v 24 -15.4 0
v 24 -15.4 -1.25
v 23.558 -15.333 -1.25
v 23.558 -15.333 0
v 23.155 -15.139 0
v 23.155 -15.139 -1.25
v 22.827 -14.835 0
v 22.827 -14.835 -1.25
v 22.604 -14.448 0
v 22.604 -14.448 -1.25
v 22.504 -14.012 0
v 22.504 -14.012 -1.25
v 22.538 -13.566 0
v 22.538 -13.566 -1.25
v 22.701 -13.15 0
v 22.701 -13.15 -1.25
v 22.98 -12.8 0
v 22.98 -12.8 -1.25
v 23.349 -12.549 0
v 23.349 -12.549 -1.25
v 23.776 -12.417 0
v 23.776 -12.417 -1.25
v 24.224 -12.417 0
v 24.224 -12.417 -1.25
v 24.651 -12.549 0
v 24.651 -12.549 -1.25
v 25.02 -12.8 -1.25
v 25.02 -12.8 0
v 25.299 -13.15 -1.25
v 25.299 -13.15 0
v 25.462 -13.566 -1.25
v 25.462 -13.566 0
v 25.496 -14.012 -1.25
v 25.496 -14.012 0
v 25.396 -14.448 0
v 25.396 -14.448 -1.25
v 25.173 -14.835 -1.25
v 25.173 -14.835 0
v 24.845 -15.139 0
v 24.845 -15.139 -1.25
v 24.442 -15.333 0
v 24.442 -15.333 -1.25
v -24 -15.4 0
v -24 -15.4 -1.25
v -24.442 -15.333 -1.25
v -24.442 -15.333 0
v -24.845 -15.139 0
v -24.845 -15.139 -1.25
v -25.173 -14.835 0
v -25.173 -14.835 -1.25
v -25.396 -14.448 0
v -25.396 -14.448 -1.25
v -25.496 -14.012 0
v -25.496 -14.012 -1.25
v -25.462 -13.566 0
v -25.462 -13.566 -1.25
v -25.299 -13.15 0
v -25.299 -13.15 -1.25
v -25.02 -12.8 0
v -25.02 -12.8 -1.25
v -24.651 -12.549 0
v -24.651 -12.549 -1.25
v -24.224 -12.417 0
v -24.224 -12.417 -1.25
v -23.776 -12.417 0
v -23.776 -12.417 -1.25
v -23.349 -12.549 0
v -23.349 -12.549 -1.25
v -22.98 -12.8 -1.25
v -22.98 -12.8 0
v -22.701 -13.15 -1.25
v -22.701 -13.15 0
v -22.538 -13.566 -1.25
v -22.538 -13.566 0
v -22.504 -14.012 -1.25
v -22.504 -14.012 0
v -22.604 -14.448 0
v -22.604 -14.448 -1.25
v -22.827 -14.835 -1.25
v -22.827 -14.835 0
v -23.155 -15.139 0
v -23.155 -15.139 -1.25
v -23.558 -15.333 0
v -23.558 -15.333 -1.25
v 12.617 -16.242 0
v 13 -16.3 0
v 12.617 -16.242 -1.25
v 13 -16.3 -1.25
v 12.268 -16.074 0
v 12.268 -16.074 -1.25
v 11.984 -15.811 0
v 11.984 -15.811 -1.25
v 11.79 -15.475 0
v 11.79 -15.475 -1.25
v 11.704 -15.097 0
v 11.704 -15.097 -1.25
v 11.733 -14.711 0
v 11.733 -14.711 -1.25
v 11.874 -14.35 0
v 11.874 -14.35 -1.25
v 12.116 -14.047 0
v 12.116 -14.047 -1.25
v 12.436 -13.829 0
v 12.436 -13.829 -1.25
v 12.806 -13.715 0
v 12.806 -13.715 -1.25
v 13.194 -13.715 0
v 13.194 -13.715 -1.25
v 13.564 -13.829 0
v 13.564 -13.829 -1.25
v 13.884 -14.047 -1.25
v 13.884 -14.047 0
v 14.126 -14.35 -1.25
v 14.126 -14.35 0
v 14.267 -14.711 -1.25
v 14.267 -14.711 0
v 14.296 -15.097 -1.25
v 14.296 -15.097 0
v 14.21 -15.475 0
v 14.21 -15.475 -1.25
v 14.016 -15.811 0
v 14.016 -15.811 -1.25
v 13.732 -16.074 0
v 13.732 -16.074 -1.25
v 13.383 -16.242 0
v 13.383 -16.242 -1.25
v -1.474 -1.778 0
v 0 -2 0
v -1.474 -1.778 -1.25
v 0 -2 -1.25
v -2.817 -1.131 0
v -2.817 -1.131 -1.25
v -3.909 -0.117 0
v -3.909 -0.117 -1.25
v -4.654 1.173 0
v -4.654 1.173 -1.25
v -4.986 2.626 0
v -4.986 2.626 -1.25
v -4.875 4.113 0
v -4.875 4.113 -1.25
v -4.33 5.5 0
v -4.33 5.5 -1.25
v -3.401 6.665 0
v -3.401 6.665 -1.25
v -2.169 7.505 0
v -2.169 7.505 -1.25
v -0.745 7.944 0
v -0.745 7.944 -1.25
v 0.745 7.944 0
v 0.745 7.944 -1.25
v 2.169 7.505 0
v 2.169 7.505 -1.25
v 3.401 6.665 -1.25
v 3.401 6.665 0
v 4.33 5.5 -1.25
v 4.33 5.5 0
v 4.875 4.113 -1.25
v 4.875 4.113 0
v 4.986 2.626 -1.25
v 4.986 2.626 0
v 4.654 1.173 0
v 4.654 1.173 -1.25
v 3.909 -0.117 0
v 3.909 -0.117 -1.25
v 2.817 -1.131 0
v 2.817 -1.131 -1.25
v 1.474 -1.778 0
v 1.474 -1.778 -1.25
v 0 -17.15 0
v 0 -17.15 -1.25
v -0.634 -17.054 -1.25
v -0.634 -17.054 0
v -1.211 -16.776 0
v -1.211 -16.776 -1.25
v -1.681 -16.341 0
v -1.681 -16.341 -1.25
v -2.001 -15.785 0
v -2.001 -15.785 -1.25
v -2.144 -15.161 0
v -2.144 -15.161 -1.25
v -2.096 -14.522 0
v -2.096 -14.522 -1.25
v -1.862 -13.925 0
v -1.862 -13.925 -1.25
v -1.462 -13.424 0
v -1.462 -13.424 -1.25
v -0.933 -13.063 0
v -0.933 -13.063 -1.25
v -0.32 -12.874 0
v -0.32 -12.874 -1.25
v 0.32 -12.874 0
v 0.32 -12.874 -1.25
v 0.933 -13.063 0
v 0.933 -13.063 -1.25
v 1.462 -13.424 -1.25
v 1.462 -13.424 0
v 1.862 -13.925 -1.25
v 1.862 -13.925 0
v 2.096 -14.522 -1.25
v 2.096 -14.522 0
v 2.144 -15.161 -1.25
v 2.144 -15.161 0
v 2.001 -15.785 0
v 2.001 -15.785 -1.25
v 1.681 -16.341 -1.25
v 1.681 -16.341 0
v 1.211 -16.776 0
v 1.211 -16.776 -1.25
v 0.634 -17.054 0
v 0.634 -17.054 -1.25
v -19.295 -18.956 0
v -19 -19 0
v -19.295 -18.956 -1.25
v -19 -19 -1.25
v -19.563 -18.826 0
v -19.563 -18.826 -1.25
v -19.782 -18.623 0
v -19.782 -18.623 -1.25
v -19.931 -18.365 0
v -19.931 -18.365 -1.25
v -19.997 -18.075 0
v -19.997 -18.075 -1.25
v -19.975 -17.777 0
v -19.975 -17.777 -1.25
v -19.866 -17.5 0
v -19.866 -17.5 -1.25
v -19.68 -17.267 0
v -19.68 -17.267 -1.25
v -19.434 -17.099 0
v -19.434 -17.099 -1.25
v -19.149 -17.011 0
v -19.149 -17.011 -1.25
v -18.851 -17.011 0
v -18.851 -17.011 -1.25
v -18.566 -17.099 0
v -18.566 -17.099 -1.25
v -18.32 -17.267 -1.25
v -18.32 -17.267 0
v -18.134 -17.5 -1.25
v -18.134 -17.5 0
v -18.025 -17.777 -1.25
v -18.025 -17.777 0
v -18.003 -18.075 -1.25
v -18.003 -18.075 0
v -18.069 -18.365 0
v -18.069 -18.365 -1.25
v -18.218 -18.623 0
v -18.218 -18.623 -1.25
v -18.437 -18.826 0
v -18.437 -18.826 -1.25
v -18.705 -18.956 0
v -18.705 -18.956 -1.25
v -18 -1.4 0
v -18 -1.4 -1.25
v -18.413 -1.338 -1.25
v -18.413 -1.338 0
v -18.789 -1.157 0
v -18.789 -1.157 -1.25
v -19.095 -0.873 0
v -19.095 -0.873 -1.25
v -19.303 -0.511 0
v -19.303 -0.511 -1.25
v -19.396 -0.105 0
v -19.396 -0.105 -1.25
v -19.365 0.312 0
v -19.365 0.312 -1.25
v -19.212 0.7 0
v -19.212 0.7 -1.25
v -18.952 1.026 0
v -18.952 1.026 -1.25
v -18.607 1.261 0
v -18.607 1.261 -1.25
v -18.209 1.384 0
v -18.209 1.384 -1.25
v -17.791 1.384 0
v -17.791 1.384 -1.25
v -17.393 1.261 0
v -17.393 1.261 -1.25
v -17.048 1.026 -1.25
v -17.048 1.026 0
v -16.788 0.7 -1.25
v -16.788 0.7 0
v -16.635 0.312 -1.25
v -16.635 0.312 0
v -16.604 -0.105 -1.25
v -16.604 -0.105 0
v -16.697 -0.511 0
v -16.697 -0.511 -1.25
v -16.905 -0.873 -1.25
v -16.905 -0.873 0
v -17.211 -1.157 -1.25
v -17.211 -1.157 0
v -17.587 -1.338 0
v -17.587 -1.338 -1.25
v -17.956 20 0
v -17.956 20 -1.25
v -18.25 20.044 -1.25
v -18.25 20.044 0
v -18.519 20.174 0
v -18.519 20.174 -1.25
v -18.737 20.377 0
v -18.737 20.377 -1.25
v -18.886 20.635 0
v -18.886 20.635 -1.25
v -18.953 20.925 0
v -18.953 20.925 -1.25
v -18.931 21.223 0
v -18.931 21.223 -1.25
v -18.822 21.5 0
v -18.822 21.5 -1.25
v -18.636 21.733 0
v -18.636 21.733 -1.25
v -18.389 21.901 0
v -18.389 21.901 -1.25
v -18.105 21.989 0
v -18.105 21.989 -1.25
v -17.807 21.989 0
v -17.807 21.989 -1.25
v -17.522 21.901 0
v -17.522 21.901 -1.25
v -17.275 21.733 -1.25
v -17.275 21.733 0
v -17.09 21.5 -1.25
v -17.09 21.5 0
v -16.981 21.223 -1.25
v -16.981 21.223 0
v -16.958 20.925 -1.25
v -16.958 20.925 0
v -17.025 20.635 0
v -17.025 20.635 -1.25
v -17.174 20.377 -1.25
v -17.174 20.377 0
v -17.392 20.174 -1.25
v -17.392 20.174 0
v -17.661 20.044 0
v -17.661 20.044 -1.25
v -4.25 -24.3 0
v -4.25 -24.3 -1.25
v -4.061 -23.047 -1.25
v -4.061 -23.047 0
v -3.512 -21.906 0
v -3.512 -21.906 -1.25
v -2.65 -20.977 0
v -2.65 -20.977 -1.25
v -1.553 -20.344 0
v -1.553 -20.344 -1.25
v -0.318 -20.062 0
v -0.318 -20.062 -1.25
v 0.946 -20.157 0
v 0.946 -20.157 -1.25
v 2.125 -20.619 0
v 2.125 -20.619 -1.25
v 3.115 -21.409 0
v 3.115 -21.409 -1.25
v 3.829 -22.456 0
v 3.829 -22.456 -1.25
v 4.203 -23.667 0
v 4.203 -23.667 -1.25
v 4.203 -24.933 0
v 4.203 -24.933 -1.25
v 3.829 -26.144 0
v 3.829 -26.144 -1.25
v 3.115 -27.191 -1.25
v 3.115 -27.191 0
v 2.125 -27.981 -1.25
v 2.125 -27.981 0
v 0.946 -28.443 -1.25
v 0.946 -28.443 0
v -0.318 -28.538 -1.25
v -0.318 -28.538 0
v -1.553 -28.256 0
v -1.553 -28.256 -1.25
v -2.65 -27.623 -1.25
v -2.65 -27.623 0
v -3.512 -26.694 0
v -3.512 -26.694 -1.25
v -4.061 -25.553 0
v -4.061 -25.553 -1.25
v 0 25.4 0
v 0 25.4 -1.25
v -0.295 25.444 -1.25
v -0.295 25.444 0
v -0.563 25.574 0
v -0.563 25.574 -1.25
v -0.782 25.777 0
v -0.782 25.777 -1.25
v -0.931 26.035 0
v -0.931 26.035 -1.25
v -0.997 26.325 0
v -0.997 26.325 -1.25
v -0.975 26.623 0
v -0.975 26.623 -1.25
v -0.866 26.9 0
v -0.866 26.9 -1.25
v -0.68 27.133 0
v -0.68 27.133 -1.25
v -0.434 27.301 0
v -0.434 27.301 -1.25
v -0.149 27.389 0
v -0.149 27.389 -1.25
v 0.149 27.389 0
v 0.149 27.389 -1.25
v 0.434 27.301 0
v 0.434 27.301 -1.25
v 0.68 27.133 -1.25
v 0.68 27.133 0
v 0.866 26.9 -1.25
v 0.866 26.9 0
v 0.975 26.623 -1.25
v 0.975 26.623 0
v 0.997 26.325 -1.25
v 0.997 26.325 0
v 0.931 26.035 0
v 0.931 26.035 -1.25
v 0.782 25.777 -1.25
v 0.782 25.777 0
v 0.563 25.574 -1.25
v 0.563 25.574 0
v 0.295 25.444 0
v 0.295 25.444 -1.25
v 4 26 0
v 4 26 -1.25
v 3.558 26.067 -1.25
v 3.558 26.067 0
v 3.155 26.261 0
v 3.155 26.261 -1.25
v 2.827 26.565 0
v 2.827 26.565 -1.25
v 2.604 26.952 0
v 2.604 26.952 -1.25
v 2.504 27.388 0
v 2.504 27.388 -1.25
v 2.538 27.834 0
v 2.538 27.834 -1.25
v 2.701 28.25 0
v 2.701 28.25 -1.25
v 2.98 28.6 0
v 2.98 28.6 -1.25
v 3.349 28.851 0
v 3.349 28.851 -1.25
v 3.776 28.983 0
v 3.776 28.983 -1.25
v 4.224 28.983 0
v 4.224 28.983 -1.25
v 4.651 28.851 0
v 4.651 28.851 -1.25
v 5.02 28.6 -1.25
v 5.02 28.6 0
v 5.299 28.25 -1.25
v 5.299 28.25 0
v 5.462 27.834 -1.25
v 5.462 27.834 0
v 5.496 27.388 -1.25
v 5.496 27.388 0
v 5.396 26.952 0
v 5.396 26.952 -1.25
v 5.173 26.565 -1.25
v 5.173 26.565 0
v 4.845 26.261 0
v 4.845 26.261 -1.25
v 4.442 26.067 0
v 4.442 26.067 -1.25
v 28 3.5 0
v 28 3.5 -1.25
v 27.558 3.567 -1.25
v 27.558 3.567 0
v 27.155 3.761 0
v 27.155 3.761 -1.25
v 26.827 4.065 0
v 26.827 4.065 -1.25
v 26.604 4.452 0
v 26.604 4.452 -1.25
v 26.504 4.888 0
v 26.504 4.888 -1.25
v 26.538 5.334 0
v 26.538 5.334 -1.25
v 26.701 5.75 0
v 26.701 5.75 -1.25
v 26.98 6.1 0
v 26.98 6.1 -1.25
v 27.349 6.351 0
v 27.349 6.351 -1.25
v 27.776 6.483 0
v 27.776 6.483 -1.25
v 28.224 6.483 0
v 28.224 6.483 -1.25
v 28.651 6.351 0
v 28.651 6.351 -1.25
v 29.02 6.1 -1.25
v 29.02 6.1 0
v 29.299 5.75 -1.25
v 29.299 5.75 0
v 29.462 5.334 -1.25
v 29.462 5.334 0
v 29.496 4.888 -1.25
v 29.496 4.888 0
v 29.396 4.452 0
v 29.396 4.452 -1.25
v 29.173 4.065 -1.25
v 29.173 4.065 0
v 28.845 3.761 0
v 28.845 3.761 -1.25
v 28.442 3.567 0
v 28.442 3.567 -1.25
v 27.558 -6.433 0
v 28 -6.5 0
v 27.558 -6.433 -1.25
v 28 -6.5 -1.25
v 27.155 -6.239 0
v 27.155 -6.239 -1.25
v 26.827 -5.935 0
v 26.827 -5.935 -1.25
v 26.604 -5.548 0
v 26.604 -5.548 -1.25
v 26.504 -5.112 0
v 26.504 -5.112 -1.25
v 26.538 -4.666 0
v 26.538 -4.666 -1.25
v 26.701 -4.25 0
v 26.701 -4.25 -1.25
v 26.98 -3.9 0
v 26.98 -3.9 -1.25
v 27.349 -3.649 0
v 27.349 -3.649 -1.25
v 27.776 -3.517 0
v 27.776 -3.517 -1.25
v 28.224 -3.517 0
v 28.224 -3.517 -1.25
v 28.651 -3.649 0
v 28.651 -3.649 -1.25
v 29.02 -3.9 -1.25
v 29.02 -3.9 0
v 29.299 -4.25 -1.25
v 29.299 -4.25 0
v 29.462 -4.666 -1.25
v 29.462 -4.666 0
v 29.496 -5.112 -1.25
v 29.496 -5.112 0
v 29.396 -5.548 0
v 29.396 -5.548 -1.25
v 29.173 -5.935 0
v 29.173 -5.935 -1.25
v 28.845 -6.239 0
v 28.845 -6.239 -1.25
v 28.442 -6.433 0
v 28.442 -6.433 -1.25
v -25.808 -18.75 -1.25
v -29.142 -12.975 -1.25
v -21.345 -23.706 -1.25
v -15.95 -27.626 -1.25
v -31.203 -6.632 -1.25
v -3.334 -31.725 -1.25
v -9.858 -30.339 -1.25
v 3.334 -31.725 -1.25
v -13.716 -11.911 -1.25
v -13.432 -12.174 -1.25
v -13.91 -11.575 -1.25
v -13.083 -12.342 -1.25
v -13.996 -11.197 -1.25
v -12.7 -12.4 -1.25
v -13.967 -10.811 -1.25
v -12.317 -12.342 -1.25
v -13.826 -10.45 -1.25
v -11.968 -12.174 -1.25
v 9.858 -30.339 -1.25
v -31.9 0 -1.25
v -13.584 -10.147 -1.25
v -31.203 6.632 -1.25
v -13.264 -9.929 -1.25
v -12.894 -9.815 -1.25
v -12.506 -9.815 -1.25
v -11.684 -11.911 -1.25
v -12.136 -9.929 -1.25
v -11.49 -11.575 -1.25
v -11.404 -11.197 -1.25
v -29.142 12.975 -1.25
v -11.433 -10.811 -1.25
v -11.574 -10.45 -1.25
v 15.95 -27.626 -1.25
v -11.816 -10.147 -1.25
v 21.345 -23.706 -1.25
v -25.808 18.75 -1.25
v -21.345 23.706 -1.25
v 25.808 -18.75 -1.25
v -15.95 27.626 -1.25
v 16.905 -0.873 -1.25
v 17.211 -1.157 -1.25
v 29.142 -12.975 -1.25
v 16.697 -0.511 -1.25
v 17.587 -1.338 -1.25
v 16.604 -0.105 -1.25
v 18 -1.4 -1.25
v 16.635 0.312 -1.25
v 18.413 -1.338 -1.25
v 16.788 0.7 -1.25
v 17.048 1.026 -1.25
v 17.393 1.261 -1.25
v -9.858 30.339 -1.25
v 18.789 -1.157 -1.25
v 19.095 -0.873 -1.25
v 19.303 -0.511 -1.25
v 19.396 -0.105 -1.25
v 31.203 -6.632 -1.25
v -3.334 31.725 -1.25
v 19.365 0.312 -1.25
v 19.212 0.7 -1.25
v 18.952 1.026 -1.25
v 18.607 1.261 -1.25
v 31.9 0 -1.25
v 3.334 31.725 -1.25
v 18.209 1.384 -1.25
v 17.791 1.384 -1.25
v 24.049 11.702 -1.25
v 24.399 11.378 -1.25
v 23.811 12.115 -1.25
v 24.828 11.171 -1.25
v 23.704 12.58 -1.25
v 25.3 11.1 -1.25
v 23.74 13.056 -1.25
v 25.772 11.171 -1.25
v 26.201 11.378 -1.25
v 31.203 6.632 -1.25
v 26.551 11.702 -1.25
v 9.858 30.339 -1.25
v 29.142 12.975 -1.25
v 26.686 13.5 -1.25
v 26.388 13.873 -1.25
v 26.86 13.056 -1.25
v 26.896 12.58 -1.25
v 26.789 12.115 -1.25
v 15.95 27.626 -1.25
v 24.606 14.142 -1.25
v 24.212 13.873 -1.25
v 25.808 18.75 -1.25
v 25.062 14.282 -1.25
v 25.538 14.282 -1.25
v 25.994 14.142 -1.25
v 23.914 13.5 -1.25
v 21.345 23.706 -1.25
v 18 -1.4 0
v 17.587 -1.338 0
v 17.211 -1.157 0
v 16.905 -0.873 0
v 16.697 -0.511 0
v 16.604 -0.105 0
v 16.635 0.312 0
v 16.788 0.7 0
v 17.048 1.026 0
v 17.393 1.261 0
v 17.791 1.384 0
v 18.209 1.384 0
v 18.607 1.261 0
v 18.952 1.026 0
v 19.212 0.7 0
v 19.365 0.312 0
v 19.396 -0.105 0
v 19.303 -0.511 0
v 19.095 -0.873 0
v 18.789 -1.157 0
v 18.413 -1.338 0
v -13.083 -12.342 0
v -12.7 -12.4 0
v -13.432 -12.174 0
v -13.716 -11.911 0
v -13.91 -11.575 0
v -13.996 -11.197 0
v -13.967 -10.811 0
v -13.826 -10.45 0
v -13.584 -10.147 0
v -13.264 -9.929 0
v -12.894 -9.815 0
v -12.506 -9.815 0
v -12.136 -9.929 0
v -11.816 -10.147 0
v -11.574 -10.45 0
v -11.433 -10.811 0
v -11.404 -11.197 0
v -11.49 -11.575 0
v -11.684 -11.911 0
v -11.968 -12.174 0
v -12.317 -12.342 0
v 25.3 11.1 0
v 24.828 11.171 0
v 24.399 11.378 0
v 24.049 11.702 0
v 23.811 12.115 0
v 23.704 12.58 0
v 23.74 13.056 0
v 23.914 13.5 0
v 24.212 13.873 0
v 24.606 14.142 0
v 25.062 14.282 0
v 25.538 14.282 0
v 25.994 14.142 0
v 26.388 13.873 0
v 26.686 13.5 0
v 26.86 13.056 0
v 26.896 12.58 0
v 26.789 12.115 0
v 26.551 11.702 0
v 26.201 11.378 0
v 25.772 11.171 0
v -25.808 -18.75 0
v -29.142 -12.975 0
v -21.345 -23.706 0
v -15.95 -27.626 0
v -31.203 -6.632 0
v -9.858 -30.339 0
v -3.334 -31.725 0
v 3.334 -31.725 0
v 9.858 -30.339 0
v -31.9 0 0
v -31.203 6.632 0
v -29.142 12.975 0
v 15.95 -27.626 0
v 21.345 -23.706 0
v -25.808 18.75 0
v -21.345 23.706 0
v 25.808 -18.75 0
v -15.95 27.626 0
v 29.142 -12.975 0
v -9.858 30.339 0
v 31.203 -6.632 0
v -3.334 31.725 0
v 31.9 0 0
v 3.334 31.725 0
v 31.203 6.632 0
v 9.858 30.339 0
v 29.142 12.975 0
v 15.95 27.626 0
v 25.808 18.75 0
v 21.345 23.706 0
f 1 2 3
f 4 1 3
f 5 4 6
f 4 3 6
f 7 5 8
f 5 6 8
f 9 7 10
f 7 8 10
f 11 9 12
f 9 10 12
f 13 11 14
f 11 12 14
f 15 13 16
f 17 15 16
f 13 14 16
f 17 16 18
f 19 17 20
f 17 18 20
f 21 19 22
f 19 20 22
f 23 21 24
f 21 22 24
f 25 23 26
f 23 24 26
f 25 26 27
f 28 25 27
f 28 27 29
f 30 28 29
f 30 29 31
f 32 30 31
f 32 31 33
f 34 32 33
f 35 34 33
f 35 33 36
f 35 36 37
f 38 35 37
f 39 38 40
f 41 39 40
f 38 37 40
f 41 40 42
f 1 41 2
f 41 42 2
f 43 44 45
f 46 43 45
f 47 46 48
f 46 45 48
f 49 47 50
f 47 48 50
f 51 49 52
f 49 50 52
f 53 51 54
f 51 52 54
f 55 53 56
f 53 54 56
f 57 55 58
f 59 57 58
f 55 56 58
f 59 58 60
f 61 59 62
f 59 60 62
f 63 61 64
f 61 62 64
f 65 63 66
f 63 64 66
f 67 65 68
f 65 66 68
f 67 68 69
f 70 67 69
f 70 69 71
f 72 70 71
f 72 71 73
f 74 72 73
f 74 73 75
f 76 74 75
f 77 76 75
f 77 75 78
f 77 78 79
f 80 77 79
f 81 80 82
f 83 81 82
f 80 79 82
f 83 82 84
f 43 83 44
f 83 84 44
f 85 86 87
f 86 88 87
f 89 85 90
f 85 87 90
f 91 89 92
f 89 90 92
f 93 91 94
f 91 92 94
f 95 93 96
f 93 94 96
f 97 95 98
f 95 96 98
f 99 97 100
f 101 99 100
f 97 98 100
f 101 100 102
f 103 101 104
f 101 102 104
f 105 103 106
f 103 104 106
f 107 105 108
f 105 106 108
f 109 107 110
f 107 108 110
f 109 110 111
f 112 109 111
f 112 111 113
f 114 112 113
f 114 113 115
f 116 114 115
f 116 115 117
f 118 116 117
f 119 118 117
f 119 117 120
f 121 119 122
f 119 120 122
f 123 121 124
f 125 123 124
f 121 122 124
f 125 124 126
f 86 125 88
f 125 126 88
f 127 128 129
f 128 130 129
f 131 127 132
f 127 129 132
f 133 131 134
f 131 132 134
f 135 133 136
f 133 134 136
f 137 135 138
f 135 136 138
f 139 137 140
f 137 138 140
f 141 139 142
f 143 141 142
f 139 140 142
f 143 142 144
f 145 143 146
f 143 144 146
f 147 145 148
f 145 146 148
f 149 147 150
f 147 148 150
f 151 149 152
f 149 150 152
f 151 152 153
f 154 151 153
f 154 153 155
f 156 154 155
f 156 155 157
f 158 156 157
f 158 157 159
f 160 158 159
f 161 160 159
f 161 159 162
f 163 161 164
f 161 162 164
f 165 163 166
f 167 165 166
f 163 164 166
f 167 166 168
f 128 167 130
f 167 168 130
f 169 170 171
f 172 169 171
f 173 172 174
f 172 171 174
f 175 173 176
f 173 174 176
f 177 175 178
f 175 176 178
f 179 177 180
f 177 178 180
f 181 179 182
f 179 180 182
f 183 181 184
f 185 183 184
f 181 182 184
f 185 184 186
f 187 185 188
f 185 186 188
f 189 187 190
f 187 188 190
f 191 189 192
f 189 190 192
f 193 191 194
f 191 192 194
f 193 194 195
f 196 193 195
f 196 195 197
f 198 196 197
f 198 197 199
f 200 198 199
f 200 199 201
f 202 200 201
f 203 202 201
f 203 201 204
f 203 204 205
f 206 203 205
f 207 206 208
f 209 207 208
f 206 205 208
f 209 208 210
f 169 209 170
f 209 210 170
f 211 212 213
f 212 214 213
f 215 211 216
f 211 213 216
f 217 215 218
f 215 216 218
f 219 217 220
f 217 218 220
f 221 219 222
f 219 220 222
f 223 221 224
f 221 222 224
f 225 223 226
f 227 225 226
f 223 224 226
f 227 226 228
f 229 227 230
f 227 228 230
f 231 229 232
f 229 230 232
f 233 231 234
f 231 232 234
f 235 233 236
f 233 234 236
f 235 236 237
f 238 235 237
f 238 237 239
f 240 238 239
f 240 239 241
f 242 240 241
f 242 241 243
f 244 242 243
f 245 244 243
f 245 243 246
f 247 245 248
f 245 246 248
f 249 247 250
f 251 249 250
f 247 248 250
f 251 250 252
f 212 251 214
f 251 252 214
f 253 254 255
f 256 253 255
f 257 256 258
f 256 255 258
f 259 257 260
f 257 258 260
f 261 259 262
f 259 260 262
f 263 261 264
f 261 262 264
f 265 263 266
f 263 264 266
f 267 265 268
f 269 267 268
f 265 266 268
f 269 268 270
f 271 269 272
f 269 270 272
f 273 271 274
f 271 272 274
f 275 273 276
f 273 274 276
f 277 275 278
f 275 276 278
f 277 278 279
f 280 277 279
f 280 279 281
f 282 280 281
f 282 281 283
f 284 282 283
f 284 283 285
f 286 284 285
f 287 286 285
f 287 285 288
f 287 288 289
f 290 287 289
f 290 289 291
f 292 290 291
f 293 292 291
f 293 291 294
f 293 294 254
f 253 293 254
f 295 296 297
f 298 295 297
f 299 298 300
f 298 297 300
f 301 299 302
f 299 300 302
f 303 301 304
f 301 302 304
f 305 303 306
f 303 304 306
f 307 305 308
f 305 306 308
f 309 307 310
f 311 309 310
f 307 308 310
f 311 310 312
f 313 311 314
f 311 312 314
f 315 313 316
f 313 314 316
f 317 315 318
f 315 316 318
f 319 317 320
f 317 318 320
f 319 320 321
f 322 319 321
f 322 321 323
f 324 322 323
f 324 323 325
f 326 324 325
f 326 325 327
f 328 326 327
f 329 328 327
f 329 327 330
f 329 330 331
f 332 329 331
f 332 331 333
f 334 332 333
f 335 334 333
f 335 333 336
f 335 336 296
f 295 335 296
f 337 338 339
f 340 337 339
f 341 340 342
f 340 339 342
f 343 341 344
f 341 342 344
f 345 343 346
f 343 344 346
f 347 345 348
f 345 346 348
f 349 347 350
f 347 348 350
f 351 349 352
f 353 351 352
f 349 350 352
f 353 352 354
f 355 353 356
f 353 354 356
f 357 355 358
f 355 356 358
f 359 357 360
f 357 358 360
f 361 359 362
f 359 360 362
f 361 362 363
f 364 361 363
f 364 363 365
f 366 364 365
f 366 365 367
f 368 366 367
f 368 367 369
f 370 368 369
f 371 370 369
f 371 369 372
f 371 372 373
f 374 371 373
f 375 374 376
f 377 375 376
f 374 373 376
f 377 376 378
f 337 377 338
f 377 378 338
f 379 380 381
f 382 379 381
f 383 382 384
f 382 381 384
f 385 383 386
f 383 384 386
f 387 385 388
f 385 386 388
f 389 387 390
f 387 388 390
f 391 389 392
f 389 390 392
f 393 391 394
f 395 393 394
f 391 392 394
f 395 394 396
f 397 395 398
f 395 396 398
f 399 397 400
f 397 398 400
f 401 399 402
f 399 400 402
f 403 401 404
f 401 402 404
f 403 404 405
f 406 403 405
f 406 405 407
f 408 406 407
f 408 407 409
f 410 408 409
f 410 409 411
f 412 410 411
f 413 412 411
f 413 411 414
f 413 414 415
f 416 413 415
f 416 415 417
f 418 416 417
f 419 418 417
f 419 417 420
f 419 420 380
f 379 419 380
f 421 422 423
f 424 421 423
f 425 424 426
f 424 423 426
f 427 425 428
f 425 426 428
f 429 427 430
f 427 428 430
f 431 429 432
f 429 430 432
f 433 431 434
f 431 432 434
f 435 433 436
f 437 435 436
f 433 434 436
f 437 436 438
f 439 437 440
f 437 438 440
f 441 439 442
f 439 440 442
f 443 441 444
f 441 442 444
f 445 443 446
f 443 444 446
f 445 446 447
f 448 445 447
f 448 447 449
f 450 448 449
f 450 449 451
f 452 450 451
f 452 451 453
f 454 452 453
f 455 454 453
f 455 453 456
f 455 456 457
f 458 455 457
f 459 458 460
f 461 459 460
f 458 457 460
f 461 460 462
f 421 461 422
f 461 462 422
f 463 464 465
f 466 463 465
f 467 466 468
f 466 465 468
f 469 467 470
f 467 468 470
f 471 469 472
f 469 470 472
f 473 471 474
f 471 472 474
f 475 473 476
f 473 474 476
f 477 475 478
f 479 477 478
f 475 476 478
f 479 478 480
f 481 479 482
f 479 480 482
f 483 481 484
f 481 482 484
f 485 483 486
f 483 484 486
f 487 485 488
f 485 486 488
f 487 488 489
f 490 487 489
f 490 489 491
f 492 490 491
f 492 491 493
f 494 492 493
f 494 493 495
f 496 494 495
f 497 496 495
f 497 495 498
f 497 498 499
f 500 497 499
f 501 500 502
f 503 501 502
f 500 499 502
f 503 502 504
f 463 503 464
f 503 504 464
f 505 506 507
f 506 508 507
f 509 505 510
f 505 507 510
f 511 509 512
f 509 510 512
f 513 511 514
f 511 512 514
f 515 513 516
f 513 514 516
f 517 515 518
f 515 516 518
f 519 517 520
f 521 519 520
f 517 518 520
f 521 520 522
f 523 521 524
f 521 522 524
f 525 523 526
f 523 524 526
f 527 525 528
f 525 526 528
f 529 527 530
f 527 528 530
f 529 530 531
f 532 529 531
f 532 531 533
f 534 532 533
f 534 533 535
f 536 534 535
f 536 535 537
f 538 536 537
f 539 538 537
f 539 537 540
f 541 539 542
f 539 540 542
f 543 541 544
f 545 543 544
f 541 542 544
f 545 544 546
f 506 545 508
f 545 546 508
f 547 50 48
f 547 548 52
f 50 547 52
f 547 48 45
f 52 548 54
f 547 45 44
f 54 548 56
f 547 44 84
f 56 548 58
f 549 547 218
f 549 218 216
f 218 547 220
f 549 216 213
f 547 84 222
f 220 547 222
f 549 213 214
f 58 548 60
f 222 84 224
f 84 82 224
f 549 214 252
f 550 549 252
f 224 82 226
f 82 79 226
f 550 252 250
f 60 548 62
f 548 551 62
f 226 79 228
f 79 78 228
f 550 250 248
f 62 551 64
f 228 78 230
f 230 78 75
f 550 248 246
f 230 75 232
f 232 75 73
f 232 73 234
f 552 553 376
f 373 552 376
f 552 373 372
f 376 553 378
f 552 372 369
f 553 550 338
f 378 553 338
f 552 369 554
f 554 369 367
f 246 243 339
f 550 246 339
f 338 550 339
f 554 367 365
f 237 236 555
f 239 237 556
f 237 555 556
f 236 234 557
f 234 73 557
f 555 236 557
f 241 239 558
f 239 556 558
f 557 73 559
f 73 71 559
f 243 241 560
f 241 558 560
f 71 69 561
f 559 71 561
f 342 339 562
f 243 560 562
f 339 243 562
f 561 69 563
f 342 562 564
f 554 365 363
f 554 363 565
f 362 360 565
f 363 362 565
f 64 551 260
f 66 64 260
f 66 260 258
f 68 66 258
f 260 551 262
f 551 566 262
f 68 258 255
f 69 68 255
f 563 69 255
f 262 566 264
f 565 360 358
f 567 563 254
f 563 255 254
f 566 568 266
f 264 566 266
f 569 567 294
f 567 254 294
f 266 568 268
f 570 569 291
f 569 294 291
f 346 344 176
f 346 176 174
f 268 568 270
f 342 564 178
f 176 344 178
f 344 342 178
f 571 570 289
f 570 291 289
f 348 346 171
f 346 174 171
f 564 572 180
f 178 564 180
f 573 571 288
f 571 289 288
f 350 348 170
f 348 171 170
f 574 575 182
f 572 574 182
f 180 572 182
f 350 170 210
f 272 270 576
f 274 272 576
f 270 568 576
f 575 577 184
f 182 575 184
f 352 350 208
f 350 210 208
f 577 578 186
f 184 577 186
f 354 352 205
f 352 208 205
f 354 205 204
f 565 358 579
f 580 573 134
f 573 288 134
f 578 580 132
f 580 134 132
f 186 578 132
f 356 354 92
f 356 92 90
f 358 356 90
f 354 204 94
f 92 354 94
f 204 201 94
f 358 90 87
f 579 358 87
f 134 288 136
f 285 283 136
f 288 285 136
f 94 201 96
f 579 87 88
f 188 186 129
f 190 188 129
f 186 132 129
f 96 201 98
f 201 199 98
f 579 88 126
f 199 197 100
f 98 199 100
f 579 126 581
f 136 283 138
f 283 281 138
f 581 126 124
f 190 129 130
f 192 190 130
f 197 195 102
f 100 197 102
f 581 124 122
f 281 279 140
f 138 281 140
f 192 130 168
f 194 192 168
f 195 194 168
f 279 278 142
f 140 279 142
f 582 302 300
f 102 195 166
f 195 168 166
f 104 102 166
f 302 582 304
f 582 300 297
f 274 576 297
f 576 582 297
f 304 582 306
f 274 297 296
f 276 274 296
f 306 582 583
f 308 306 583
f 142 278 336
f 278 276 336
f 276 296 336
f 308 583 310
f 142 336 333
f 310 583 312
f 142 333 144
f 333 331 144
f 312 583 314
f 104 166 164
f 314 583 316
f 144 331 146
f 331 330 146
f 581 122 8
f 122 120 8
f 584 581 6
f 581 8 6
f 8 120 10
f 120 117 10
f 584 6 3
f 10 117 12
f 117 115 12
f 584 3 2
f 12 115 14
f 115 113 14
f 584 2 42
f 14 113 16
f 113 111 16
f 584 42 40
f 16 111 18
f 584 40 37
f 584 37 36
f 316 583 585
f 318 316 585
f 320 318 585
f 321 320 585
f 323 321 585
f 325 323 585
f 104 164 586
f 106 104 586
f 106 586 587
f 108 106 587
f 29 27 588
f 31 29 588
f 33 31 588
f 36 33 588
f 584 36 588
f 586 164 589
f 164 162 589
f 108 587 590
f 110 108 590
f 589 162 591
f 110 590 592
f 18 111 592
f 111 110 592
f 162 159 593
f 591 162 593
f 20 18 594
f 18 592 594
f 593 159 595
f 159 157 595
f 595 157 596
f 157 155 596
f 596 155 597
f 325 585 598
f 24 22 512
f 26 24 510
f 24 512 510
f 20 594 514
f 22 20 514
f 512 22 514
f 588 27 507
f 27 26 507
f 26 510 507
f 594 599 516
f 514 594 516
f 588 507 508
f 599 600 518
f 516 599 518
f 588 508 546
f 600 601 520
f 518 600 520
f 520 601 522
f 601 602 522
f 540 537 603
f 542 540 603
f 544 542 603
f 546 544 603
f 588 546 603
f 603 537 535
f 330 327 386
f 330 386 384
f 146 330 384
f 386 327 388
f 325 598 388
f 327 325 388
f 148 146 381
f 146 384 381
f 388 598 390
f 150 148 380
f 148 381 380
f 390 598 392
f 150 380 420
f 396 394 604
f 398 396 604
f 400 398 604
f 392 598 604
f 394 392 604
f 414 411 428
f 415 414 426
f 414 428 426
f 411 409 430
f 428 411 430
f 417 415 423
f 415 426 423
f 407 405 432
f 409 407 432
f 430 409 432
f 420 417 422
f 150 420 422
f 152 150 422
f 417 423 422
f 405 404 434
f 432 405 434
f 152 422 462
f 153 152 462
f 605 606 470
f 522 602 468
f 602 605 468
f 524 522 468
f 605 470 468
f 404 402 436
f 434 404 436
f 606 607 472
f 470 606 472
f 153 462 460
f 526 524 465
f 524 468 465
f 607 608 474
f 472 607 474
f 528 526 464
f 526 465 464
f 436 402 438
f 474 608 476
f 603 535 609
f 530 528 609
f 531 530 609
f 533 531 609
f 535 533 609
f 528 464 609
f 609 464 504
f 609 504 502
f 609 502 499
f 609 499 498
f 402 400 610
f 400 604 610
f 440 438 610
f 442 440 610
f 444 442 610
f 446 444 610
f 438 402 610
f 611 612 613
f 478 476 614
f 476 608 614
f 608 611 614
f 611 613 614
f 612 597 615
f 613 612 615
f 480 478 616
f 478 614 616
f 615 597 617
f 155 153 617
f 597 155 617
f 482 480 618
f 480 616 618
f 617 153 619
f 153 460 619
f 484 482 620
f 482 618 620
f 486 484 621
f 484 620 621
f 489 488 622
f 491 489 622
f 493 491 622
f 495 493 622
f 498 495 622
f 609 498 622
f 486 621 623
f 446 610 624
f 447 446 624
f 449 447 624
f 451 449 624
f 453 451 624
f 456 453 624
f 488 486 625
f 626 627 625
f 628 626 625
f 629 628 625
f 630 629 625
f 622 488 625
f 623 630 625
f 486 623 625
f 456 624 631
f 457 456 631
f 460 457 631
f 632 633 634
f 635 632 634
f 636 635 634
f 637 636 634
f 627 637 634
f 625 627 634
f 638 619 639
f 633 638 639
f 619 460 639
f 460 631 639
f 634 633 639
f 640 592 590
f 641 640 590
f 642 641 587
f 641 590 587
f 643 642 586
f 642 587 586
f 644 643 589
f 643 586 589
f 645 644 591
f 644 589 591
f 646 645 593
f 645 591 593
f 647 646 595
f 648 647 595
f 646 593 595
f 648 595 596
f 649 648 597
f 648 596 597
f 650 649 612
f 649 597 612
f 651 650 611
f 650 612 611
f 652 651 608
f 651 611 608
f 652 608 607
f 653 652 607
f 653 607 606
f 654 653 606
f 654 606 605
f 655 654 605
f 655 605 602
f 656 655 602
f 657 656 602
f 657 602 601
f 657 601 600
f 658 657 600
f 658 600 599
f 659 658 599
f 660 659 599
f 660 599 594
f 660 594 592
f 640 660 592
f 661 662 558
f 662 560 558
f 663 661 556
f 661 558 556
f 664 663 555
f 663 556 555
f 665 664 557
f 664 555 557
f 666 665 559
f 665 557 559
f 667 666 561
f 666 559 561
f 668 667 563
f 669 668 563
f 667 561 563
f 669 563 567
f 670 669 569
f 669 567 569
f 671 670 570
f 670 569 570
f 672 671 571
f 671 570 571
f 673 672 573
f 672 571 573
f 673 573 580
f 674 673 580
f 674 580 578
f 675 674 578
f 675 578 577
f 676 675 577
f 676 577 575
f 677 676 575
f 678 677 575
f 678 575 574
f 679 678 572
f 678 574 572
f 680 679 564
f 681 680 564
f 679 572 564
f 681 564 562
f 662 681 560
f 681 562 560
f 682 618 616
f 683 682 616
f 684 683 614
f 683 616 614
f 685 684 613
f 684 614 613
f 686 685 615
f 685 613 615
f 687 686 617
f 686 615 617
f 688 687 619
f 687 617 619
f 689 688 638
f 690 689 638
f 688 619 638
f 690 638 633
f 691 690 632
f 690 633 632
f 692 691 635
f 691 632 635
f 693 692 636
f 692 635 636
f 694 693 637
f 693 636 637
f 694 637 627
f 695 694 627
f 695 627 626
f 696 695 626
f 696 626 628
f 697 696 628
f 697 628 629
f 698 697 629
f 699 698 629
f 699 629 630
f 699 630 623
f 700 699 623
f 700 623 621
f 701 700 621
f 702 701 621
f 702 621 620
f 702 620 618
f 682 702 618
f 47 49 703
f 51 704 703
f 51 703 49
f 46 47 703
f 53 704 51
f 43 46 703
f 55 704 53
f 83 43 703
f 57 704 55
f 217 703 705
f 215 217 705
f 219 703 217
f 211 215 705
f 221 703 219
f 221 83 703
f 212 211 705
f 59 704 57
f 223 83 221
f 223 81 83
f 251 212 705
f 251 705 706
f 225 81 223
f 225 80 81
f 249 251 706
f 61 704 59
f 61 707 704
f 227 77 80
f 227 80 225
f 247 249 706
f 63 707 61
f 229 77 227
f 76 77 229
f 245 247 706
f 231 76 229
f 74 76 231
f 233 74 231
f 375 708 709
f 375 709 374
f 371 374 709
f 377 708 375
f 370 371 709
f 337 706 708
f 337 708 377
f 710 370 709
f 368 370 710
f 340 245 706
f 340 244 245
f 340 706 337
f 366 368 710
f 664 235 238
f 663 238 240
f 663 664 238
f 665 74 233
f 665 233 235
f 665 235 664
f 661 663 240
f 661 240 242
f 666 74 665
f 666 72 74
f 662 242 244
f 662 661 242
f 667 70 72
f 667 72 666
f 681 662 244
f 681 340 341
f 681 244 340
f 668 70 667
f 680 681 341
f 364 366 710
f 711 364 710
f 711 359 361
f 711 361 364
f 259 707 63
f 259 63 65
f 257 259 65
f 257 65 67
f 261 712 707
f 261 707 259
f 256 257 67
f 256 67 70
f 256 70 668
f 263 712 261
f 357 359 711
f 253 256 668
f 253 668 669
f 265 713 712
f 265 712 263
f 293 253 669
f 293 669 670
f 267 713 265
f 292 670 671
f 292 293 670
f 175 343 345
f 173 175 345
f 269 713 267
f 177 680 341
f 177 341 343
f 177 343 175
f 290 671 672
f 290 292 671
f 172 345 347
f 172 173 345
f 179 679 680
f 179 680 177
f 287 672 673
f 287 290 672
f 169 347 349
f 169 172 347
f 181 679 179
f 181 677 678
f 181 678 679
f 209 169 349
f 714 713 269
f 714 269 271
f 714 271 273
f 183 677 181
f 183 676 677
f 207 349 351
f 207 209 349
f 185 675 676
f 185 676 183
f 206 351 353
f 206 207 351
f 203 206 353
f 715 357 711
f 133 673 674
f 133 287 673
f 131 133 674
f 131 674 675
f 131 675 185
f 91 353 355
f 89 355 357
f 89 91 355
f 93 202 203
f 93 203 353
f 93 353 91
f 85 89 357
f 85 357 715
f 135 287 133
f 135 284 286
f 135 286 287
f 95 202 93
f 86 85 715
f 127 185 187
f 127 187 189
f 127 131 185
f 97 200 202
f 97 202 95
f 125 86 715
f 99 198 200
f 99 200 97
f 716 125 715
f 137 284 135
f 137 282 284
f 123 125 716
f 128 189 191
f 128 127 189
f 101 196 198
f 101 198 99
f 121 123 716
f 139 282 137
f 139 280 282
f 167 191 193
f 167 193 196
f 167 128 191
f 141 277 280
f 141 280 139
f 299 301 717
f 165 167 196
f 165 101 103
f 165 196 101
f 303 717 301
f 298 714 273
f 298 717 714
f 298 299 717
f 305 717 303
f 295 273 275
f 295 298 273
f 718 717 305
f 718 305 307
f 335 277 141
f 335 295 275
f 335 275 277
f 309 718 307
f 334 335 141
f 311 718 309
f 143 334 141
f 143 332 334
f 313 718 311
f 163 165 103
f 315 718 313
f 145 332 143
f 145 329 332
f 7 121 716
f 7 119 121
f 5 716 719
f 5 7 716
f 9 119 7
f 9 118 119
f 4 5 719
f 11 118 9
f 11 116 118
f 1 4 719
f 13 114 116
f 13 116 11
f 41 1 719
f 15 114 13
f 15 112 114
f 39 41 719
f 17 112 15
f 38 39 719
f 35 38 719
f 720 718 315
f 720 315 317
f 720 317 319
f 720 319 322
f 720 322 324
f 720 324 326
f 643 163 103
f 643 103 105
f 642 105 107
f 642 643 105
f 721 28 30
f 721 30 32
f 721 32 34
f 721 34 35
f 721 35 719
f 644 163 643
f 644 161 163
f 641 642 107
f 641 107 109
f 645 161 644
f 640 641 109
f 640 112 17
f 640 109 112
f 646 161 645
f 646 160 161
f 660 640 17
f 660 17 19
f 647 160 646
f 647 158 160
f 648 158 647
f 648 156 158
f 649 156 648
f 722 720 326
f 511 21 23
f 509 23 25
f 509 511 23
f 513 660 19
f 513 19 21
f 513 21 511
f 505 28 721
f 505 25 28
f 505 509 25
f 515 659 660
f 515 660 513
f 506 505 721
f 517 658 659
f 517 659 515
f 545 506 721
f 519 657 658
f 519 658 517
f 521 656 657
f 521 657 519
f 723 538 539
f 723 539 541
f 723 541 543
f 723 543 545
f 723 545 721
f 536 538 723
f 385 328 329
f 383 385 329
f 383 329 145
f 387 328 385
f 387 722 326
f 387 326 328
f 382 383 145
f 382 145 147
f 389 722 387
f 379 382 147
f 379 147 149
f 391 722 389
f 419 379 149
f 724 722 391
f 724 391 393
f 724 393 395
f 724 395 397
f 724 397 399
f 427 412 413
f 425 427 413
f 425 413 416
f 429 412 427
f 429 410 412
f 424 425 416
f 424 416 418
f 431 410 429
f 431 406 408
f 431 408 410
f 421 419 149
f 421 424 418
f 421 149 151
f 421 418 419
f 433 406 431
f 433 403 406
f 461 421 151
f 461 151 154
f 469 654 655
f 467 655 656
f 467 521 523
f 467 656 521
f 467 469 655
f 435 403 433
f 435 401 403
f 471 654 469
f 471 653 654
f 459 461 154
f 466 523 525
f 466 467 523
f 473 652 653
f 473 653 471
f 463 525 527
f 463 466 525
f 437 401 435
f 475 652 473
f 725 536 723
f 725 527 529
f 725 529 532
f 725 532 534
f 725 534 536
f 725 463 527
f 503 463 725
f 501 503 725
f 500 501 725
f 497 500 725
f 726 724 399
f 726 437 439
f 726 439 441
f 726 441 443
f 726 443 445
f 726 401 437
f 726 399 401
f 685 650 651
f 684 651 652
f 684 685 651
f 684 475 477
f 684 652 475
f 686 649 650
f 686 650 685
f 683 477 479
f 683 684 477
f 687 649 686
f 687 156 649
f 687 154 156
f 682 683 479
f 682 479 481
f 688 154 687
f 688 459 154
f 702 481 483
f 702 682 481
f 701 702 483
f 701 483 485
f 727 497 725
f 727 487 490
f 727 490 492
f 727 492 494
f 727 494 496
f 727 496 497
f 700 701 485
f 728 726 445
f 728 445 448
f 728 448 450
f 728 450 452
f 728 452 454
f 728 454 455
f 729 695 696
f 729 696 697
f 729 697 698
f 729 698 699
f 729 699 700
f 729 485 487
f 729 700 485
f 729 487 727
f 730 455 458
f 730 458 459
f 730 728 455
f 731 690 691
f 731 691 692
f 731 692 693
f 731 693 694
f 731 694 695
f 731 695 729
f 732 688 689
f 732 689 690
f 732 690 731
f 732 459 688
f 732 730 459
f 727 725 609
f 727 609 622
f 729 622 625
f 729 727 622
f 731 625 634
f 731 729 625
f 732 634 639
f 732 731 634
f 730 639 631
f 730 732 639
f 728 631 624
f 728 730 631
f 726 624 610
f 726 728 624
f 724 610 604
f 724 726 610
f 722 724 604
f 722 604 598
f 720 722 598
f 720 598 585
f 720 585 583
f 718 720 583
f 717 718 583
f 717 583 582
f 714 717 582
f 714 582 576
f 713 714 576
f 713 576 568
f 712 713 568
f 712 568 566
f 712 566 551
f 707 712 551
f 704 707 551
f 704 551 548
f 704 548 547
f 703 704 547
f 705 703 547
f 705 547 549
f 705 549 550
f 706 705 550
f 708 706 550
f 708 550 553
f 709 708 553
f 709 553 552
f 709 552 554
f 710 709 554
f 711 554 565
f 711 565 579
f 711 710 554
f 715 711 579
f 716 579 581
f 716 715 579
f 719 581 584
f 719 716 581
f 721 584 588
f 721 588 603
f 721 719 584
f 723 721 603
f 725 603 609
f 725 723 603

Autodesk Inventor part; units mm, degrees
ref_plane "YZ Plane" through (0, 0, 0) normal (1, 0, 0) x (0, 1, 0)
ref_plane "XZ Plane" through (0, 0, 0) normal (0, 1, 0) x (-1, 0, 0)
ref_plane "XY Plane" through (0, 0, 0) normal (0, 0, 1) x (1, 0, 0)
sketch "Sketch1" plane through (0, 0, 0) normal (0, 0, 1) x (1, 0, 0)
  circle A0 centre (0, 0) radius 31.9
  dimension "d0" = 63.8
extrude "Extrusion1" add sketch "Sketch1" against normal blind 1.25
sketch "Sketch2" plane through (0, 0, 0) normal (0, 0, 1) x (1, 0, 0)
  point P0 (0, 0)
  point P1 (-19, -18)
  dimension "d3" = 19
  dimension "d4" = 18
hole "Hole1" at (-19, -18, 0) direction (0, 0, -1) diameter 2 end through all
sketch "Sketch3" plane through (0, 0, 0) normal (0, 0, 1) x (1, 0, 0)
  point P0 (0, 0)
  point P1 (-17.9556, 21)
  point P2 (0, 26.4)
  dimension "d12" = 26.4
  dimension "d101" = 18.75
  dimension "d102" = 21
hole "Hole2" at (-17.9556, 21, 0) at (0, 26.4, 0) direction (0, 0, -1) diameter 2 end through all
sketch "Sketch4" plane through (0, 0, 0) normal (0, 0, 1) x (1, 0, 0)
  point P0 (0, 0)
  point P1 (-12.7, -11.1)
  point P2 (13, -15)
  dimension "d22" = 15
  dimension "d23" = 11.1
  dimension "d24" = 12.7
  dimension "d25" = 13
hole "Hole3" at (-12.7, -11.1, 0) at (13, -15, 0) direction (0, 0, -1) diameter 2.6 end through all
sketch "Sketch5" plane through (0, 0, 0) normal (0, 0, 1) x (1, 0, 0)
  line L0 (-18, 0) -> (18, 0) construction
  point P0 (0, 0)
  point P1 (0, 0)
  dimension "d33" = 36
hole "Hole4" at (18, 0, 0) at (-18, 0, 0) direction (0, 0, -1) diameter 2.8 end through all
sketch "Sketch6" plane through (0, 0, 0) normal (0, 0, 1) x (1, 0, 0)
  point P0 (0, 0)
  point P1 (24, -13.9)
  point P2 (-24, -13.9)
  point P3 (4, 27.5)
  dimension "d41" = 24
  dimension "d42" = 13.9
  dimension "d59" = 4
  dimension "d61" = 24
  dimension "d62" = 13.9
  dimension "d63" = 27.5
hole "Hole5" at (24, -13.9, 0) at (4, 27.5, 0) at (-24, -13.9, 0) direction (0, 0, -1) diameter 3 end through all
sketch "Sketch7" plane through (0, 0, 0) normal (0, 0, 1) x (1, 0, 0)
  point P0 (0, 0)
  point P1 (25.3, 12.7)
  dimension "d50" = 12.7
  dimension "d51" = 25.3
hole "Hole6" at (25.3, 12.7, 0) direction (0, 0, -1) diameter 3.2 end through all
sketch "Sketch8" plane through (0, 0, 0) normal (0, 0, 1) x (1, 0, 0)
  point P0 (0, 0)
  point P1 (0, -15)
  dimension "d64" = 15
hole "Hole7" at (0, -15, 0) direction (0, 0, -1) diameter 4.3 end through all
sketch "Sketch10" plane through (0, 0, 0) normal (0, 0, 1) x (1, 0, 0)
  point P0 (0, 0)
  point P1 (0, 3)
  dimension "d81" = 3
hole "Hole9" at (0, 3, 0) direction (0, 0, -1) diameter 10 end through all
sketch "Sketch11" plane through (0, 0, 0) normal (0, 0, 1) x (1, 0, 0)
  point P0 (0, 0)
  point P1 (0, 0)
  point P2 (28, -5)
  point P3 (28, 5)
  dimension "d91" = 28
  dimension "d92" = 5
  dimension "d93" = 5
hole "Hole10" at (28, -5, 0) at (28, 5, 0) direction (0, 0, -1) diameter 3 end through all
sketch "Sketch12" plane through (0, 0, -1.25) normal (0, 0, -1) x (-1, 0, 0)
  circle A0 centre (0, 0) radius 31.875
  line L0 (0, 0) -> (0, -24.3) construction
  circle A1 centre (0, -24.3) radius 4.25
  point P0 (-3.6509, -26.4756)
  point P1 (3.6509, -26.4756)
  point P2 (-3.6509, -22.1244)
  point P3 (3.6509, -22.1244)
  dimension "d103" = 24.3
  dimension "d104" = 8.5
  dimension "d105" = 63.75
extrude "Extrusion2" cut sketch "Sketch12" against normal through all contours A1
equation "\"d62\" = d42"
equation "\"d93\" = d92"
properties part number "403-01" material "Aluminum-6061"
